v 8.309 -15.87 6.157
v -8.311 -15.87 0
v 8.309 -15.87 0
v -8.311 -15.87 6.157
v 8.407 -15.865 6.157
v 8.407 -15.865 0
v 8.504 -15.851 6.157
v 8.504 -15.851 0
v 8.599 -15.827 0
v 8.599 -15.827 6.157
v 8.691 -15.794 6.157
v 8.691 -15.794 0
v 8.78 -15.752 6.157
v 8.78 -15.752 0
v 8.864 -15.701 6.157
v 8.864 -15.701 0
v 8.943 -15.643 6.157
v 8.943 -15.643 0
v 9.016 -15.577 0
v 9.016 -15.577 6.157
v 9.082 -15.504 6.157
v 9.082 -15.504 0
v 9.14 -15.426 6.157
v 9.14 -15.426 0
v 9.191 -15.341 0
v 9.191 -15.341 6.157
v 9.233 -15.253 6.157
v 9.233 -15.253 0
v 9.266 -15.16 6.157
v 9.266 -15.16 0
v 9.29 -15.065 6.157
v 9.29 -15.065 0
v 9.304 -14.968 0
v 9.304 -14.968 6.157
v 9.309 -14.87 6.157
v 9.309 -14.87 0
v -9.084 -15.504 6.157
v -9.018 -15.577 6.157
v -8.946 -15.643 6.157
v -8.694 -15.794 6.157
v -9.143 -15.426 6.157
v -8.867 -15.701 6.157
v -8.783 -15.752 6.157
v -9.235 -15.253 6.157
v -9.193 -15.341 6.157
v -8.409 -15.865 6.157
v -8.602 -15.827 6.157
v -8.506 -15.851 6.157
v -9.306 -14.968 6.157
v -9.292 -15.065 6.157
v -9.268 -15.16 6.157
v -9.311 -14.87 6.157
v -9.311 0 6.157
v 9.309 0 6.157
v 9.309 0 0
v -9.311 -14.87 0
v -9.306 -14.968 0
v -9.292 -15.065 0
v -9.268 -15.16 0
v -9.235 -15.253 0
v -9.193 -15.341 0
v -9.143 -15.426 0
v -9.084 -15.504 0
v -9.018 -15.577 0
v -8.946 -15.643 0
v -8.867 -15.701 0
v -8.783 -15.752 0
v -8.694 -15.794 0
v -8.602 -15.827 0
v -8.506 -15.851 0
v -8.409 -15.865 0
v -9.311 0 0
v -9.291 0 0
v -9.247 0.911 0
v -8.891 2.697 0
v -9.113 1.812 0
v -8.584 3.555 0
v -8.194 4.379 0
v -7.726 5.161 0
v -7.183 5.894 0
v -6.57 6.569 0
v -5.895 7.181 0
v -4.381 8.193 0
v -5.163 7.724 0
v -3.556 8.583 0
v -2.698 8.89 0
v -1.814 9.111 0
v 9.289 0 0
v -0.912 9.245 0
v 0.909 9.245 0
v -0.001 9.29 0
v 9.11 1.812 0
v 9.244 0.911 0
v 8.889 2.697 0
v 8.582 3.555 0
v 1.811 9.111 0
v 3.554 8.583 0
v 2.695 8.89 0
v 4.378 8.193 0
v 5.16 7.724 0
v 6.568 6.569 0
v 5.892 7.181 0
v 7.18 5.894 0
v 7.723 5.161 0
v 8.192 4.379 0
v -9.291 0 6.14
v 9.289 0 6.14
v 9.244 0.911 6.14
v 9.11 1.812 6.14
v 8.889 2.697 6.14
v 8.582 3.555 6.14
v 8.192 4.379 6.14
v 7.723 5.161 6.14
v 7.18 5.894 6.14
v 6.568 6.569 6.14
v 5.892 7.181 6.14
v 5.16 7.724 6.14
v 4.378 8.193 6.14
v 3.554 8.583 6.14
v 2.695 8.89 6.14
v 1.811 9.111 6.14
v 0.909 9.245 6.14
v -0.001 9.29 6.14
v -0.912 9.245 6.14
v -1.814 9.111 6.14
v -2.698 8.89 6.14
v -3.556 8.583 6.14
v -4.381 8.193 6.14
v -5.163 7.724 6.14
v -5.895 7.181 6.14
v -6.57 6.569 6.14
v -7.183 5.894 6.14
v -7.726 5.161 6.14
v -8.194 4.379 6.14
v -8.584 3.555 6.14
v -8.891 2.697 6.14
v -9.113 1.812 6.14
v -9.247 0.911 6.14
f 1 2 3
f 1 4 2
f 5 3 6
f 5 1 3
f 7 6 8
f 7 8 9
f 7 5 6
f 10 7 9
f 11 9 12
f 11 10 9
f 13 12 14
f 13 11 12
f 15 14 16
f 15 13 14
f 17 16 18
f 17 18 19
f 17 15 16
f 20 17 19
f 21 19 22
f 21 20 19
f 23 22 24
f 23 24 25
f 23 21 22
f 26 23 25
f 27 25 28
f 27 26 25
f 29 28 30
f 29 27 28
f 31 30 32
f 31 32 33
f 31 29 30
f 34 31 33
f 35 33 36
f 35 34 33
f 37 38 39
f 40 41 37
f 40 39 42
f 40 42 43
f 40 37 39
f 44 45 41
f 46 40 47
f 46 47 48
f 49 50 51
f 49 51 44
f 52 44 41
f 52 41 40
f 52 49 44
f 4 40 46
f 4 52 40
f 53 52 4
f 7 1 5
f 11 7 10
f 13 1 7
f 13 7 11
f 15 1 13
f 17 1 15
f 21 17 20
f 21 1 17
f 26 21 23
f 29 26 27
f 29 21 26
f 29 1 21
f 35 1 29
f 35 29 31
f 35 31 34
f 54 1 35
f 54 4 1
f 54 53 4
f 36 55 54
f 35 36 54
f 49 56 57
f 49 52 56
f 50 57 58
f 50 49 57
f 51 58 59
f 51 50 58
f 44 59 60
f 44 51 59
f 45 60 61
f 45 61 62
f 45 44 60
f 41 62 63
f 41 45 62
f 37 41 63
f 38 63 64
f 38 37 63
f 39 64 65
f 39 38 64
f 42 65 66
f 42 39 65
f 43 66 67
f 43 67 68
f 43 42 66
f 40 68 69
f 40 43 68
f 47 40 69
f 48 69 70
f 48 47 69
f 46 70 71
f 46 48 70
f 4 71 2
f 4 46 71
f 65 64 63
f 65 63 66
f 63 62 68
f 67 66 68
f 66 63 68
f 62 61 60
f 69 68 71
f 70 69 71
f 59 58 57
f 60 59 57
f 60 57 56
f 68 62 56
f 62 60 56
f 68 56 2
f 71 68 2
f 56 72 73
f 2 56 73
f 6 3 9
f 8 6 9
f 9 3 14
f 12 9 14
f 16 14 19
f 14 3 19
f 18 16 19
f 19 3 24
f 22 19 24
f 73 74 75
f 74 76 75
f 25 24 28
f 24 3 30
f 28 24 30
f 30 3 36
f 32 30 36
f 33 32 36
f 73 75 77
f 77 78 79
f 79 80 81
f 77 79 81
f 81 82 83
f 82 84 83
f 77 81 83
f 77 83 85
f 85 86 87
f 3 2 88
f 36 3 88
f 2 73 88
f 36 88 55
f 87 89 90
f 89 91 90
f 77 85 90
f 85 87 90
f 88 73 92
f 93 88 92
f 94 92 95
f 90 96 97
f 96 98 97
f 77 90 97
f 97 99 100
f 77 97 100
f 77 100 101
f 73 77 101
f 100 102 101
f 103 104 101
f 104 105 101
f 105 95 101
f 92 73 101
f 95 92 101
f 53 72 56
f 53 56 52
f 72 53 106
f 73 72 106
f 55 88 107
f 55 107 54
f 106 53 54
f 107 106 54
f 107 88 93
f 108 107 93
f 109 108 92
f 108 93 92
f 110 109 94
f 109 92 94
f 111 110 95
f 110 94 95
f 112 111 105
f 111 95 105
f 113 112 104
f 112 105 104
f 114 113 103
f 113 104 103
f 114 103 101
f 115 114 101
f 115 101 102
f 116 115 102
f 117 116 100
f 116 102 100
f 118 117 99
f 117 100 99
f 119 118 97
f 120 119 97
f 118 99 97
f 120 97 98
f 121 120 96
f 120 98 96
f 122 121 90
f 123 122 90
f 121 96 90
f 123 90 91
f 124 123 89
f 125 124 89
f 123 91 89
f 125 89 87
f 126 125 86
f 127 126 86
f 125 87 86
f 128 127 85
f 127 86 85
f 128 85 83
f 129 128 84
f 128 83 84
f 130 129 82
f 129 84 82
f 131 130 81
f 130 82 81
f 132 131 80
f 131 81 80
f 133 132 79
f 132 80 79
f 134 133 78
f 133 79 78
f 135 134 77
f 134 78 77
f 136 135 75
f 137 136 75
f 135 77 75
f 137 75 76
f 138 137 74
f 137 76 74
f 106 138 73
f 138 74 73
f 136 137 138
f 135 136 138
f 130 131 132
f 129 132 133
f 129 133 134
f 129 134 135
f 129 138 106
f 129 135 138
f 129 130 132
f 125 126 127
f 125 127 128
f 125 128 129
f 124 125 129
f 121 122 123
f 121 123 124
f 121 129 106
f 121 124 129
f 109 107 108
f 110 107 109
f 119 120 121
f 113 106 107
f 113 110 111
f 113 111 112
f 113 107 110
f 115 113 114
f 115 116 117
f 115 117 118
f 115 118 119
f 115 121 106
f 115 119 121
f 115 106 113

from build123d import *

# Parameters (mm, degrees)
SKETCH_1_W          = 9.29
SKETCH_1_H          = 1.5
REVOLVE_1_ANGLE     = 180
EXTRUDE_1_DEPTH     = 4.65
SKETCH_3_W          = 18.62
SKETCH_3_H          = 6.156693915
EXTRUDE_2_DEPTH     = 15.87
FILLET_1_R          = 1
CUT_EXTRUDE_1_DEPTH = 0.01


with BuildPart() as part:
    # 草图1 → 旋转1 (revolve)
    with BuildSketch(Plane.XZ):
        with Locations((-4.646272468, 0.75)):
            Rectangle(SKETCH_1_W, SKETCH_1_H)
    revolve(axis=Axis((-0.001272468, 0, 0), (0, 0, -1)), revolution_arc=REVOLVE_1_ANGLE)

    # 草图2 → 凸台-拉伸1 (add)
    with BuildSketch(Plane.XY.offset(1.5)):
        with BuildLine():
            Line((-9.291272468, 0), (9.288727532, 0))
            ThreePointArc((9.288727532, 0), (-0.001272468, 9.29), (-9.291272468, 0))
        make_face()
    extrude(amount=EXTRUDE_1_DEPTH)

    # 草图3 → 凸台-拉伸2 (add)
    with BuildSketch(Plane.XZ):
        with Locations((-0.001272468, 3.078346957)):
            Rectangle(SKETCH_3_W, SKETCH_3_H)
    extrude(amount=EXTRUDE_2_DEPTH)

    # 圆角1
    fillet_1_edges = [part.edges().sort_by_distance(p)[0] for p in [
        (9.308727532, -15.87, 3.078346957),
        (-9.311272468, -15.87, 3.078346957),
    ]]
    fillet(fillet_1_edges, radius=FILLET_1_R)

    # 草图4 → 切除-拉伸1 (cut)
    with BuildSketch(Plane.XY.offset(6.15)):
        with BuildLine():
            Line((-9.291272468, 0), (9.288727532, 0))
            ThreePointArc((9.288727532, 0), (-0.001272468, 9.29), (-9.291272468, 0))
        make_face()
    extrude(amount=-CUT_EXTRUDE_1_DEPTH, mode=Mode.SUBTRACT)


solid = part.part
